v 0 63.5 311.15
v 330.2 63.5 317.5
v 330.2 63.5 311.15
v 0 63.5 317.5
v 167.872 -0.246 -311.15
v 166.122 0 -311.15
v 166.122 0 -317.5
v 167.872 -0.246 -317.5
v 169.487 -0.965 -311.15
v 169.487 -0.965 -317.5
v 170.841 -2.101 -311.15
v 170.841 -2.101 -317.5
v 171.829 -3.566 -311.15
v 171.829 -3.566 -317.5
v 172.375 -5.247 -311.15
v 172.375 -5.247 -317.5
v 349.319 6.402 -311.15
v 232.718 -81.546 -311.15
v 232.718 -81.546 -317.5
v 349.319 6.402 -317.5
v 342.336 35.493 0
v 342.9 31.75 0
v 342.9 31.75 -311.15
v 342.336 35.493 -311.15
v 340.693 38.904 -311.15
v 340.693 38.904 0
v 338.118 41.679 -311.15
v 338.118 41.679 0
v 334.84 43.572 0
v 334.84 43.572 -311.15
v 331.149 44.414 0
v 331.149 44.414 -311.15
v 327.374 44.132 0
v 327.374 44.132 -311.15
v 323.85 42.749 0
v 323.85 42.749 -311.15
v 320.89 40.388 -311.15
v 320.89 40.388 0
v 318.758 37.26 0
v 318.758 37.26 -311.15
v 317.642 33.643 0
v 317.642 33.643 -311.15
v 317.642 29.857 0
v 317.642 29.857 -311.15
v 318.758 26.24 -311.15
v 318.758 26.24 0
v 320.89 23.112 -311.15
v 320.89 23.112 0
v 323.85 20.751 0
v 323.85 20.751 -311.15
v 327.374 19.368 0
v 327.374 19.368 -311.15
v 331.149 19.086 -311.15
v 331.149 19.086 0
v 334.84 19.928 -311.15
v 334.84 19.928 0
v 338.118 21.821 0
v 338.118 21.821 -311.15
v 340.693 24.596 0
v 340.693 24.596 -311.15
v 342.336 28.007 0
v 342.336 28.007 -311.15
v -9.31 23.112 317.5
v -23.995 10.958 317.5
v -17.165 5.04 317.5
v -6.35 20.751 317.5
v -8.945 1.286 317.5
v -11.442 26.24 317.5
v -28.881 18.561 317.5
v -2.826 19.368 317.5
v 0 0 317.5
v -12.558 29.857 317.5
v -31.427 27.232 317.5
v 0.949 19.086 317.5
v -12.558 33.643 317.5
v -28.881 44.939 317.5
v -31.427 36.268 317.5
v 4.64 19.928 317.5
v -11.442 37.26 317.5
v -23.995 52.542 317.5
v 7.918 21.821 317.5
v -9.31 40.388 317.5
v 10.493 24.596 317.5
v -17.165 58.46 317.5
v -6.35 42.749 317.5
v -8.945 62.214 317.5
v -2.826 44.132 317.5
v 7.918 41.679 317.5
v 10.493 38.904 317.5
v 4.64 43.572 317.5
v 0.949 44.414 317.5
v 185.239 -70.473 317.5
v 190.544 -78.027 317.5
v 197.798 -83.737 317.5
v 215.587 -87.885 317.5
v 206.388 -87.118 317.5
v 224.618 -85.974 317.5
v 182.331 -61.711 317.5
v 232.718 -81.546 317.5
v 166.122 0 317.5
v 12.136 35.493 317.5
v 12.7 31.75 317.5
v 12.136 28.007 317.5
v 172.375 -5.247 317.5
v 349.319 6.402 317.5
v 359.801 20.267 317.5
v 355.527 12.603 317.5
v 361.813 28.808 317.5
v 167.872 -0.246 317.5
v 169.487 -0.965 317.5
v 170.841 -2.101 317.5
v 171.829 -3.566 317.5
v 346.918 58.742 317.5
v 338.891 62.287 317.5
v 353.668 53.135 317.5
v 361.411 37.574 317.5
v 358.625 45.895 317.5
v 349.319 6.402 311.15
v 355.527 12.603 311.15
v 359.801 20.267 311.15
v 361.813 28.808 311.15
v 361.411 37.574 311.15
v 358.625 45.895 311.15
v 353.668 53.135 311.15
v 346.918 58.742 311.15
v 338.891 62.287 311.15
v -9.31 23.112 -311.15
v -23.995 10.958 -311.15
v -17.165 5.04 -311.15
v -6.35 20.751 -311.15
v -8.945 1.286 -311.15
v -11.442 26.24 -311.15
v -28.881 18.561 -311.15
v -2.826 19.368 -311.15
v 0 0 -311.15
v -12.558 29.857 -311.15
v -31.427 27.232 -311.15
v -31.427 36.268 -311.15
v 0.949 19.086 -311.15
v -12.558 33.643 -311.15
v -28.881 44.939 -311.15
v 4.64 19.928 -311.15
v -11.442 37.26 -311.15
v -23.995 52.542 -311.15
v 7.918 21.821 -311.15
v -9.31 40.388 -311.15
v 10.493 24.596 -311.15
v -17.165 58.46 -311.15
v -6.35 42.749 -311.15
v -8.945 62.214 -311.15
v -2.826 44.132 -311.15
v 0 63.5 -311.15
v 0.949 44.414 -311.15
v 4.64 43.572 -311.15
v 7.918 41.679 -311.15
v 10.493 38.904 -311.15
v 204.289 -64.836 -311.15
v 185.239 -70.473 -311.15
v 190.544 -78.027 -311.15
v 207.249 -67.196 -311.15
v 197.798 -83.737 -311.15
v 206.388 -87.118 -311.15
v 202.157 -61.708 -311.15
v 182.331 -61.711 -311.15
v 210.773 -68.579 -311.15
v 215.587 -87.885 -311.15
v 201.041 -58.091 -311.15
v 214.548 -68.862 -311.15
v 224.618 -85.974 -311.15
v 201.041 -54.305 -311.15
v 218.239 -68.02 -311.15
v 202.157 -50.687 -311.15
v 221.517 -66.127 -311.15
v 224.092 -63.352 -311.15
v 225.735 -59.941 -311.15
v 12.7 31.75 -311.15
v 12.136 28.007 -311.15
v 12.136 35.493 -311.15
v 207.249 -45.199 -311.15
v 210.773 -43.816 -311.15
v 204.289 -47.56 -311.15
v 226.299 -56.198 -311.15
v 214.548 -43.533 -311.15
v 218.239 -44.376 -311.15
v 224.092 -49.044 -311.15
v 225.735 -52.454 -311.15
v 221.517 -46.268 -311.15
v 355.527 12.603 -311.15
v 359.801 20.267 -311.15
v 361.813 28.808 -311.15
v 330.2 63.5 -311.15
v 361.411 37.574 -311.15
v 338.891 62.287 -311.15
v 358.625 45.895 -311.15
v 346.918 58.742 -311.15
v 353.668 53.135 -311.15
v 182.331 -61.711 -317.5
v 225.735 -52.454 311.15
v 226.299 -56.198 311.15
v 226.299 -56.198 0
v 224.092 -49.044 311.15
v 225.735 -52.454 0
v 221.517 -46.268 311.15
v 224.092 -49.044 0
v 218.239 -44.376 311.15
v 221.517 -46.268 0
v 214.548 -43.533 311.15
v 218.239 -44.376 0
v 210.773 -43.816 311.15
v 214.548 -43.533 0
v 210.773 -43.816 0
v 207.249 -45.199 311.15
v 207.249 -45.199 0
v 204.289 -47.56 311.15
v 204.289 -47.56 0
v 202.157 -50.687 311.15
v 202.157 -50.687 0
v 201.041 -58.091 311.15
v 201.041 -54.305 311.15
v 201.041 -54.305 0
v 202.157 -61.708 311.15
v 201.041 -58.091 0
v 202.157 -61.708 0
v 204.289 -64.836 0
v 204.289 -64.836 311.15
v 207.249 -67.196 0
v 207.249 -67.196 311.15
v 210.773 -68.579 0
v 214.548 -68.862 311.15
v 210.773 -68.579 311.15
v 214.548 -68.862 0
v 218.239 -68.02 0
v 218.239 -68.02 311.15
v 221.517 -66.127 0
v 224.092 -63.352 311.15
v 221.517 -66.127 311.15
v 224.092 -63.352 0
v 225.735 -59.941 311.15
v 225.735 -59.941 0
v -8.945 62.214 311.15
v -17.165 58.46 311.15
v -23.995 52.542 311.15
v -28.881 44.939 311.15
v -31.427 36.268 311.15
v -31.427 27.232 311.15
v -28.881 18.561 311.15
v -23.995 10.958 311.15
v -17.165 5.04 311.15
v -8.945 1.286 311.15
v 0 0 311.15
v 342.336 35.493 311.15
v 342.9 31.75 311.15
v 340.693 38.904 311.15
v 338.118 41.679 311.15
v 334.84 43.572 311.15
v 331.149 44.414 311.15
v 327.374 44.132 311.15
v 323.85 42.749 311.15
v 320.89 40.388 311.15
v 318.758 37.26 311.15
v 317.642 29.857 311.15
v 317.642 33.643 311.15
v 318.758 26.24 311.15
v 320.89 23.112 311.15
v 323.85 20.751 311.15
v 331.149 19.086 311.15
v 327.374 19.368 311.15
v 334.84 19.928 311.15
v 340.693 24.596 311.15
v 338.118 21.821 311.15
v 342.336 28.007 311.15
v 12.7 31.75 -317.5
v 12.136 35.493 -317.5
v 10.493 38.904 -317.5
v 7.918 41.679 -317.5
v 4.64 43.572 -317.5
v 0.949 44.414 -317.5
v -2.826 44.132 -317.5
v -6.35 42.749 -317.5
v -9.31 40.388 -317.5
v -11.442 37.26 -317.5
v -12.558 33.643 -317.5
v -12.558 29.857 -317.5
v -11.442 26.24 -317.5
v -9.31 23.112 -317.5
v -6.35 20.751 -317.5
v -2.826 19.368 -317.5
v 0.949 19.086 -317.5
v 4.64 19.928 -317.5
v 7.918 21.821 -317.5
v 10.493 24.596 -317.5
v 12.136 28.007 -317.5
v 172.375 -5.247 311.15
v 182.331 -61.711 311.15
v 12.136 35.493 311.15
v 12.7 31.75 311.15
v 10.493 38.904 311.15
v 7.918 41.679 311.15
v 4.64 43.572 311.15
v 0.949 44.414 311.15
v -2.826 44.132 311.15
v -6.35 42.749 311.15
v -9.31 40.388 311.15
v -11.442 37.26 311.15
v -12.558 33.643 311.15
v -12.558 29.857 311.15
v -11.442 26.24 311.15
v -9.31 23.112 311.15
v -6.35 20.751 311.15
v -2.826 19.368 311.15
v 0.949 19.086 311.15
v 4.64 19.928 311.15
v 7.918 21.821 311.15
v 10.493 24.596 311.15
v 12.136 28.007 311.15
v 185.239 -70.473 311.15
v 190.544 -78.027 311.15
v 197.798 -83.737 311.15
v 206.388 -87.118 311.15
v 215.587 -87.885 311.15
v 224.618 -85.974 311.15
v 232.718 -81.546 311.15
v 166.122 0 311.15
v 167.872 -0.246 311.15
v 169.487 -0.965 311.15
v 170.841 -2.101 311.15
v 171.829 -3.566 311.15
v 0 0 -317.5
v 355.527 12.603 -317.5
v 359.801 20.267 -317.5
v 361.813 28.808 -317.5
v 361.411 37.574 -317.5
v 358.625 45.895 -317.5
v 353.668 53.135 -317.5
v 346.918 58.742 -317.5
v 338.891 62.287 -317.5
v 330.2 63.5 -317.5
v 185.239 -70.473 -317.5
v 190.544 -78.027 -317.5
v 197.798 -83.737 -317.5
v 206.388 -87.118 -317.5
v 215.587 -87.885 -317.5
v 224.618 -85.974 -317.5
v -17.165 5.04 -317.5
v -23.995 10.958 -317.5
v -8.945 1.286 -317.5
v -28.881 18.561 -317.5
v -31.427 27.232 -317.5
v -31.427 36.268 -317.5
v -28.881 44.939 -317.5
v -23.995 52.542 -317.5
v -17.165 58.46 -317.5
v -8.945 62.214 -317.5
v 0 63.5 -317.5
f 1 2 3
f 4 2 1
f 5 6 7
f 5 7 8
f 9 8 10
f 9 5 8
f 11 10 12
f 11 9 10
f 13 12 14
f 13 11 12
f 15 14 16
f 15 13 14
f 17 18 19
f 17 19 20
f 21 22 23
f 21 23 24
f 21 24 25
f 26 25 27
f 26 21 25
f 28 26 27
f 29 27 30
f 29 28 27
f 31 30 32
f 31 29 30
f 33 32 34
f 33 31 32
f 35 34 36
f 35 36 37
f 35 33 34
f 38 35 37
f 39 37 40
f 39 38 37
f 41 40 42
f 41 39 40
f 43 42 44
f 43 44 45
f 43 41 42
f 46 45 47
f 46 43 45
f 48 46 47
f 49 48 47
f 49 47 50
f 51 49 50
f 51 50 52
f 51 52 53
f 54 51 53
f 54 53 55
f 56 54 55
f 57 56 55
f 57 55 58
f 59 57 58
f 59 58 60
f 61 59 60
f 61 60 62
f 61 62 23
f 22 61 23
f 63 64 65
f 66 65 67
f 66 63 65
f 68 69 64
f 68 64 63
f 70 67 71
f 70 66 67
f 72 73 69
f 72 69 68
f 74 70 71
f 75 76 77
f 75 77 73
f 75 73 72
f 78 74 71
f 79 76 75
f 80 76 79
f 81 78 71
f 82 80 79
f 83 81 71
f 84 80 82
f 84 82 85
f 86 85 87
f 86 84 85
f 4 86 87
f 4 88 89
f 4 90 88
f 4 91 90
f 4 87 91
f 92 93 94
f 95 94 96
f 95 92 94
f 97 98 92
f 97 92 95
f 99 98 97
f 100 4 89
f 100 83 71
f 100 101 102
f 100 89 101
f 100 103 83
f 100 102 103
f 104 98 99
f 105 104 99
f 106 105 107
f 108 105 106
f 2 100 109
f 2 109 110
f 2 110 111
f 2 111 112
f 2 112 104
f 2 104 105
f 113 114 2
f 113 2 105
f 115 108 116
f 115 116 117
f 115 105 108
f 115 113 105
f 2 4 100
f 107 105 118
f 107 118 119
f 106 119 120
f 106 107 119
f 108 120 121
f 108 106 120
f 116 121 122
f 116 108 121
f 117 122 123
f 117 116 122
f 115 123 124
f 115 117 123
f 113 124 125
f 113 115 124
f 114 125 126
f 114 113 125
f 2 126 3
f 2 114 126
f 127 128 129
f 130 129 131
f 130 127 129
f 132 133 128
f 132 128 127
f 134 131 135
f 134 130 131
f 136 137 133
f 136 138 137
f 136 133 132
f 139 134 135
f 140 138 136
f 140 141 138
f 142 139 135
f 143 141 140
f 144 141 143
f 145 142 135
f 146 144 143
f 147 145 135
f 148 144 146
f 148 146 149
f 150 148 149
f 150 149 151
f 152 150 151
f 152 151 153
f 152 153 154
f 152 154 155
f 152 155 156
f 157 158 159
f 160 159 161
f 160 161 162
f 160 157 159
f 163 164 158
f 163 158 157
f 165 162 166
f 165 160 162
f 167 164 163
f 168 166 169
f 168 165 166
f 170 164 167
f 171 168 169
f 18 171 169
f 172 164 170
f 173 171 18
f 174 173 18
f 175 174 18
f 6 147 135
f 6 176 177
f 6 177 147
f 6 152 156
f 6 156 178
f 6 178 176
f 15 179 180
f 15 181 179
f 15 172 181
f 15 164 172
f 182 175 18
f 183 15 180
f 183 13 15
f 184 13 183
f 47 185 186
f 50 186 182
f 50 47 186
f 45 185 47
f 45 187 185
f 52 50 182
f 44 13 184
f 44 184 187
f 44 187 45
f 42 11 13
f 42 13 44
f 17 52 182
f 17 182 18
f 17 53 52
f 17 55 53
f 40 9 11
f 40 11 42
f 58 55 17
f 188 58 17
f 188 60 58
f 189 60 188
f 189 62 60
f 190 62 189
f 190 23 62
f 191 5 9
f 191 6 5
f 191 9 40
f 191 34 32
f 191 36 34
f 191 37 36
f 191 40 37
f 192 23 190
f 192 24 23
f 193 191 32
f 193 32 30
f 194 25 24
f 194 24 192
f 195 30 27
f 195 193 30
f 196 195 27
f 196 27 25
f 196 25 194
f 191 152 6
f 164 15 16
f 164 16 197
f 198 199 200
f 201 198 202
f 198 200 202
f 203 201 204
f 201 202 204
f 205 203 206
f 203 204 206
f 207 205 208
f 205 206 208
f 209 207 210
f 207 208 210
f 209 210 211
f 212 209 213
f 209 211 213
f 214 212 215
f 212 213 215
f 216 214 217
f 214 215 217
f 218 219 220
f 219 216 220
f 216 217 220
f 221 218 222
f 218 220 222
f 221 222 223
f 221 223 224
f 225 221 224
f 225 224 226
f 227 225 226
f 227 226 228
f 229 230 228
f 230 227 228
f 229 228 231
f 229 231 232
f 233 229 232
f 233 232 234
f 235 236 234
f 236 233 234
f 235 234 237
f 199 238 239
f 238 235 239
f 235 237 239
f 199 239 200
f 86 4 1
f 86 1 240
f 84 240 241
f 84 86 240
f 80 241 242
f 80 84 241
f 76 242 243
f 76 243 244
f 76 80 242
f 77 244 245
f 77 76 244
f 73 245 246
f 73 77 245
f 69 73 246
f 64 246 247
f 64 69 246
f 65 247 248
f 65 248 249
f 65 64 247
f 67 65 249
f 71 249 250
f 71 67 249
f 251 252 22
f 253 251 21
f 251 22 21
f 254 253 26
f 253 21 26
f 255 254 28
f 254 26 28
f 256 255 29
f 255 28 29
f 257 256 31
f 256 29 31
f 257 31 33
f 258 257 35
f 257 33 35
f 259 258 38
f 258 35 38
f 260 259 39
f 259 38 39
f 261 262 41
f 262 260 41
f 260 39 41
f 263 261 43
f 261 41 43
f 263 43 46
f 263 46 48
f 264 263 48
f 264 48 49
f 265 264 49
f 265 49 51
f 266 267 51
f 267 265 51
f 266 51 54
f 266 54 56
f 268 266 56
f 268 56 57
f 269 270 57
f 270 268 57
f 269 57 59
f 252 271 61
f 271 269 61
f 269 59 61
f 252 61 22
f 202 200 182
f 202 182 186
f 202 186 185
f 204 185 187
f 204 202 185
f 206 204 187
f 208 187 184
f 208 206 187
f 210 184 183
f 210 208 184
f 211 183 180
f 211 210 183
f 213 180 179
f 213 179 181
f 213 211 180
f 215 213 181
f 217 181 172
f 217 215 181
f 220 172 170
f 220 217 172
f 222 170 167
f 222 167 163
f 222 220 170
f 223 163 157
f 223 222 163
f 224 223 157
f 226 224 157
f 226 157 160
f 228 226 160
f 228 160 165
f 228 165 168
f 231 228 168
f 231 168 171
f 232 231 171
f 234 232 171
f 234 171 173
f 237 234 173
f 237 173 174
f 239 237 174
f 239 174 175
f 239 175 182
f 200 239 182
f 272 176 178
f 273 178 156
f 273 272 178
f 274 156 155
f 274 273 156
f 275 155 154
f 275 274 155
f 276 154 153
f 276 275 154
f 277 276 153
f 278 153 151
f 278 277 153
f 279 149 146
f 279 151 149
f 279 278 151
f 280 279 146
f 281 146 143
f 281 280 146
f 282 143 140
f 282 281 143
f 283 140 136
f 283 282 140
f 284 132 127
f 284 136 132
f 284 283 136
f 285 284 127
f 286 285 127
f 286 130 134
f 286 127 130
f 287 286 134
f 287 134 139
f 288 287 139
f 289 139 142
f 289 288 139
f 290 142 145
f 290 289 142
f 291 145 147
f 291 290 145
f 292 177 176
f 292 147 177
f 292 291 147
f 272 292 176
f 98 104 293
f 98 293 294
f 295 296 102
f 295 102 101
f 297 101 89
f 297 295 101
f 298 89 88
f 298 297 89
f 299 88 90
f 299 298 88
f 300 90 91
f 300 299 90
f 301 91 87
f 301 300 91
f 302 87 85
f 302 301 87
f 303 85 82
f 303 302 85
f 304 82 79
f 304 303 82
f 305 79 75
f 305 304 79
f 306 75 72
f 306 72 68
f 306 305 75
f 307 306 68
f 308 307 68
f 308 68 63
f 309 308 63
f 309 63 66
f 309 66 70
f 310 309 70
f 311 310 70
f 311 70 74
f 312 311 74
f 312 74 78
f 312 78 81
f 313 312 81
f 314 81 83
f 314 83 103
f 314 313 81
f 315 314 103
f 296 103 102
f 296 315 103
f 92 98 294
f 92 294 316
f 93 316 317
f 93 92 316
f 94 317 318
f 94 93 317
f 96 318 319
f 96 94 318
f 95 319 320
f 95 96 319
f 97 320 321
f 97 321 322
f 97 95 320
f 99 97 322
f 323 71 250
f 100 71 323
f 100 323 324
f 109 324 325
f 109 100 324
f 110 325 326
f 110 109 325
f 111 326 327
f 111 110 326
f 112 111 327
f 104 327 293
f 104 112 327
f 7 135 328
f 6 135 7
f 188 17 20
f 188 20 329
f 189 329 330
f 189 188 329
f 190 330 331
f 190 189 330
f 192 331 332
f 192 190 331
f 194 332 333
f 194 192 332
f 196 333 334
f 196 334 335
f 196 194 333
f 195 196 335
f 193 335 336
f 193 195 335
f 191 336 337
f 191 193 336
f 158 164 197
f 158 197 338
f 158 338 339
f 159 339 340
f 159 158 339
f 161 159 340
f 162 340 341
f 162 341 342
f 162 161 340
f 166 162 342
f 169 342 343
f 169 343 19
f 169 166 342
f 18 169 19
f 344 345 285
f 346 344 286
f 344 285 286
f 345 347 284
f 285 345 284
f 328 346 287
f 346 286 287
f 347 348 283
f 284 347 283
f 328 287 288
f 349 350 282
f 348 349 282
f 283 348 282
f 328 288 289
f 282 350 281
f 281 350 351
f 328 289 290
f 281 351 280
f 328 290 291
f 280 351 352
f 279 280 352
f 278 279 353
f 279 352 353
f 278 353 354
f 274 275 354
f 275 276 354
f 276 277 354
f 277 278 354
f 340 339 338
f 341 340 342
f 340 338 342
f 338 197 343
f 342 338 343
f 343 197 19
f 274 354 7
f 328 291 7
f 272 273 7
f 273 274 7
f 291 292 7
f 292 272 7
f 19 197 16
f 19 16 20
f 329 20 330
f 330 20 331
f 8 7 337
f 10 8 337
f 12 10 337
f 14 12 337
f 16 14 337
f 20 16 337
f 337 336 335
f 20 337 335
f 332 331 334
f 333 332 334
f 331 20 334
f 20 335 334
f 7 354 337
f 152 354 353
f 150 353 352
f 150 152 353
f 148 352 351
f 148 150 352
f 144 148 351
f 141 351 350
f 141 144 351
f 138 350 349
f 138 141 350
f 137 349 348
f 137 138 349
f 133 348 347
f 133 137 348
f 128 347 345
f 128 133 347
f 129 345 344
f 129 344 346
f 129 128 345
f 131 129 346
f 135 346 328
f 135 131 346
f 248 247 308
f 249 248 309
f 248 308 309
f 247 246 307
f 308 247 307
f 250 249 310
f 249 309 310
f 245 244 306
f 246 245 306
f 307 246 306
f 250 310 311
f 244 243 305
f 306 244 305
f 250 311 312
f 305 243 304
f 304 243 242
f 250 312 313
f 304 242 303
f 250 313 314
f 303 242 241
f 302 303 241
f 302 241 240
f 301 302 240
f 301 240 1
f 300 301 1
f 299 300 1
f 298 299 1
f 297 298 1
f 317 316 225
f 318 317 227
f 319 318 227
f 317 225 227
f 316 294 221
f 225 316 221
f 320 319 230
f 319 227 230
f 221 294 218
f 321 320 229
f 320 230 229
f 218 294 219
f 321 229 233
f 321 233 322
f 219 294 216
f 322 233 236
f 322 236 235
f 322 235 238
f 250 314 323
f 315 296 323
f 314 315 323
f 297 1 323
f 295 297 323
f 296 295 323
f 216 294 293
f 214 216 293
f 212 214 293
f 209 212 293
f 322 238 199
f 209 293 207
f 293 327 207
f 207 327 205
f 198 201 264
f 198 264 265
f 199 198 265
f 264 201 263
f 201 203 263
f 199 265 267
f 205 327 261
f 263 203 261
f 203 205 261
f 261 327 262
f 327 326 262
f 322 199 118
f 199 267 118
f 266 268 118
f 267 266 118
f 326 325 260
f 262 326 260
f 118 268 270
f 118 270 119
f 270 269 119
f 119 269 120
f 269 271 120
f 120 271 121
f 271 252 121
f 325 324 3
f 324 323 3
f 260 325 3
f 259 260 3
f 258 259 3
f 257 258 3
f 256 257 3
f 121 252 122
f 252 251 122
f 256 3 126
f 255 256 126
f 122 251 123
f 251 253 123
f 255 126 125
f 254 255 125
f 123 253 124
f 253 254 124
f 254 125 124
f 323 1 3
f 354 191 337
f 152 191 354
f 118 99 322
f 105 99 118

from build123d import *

# Parameters (mm, degrees)
SKETCH1_R                       = 12.7
BOSS_EXTRUDE1_DEPTH             = 317.5
SKETCH2_W                       = 393.7
SKETCH2_H                       = 622.3
CUT_EXTRUDE1_DEPTH              = 152.447724951
BOSS_EXTRUDE2_REACH             = 319.5
SKETCH3_R                       = 12.7
BOSS_EXTRUDE2_DIRECTION_2_REACH = 319.5


with BuildPart() as part:
    # Sketch1 → Boss-Extrude1 (new body, symmetric)
    with BuildSketch(Plane.XY):
        with BuildLine():
            Line((0, 0), (166.121717342, 0))
            ThreePointArc((166.121717342, 0), (170.203418664, -1.485617786), (172.375246574, -5.247334072))
            Line((172.375246574, -5.247334072), (182.331323933, -61.711054592))
            ThreePointArc((182.331323933, -61.711054592), (201.969223554, -85.741108229), (232.718040732, -81.545774931))
            Line((232.718040732, -81.545774931), (349.319070642, 6.40195002))
            ThreePointArc((349.319070642, 6.40195002), (360.307001568, 41.83121801), (330.2, 63.5))
            Line((330.2, 63.5), (0, 63.5))
            ThreePointArc((0, 63.5), (-31.75, 31.75), (0, 0))
        make_face()
        with Locations((0, 31.75)):
            Circle(SKETCH1_R, mode=Mode.SUBTRACT)
    extrude(amount=BOSS_EXTRUDE1_DEPTH, both=True)

    # Sketch2 → Cut-Extrude1 (cut, through all)
    with BuildSketch(Plane(origin=(0, 63.5, 0), x_dir=(1, 0, 0), z_dir=(0, 1, 0))):
        with Locations((165.1, 0)):
            Rectangle(SKETCH2_W, SKETCH2_H)
    extrude(amount=-CUT_EXTRUDE1_DEPTH, mode=Mode.SUBTRACT)

    # Sketch3 → Boss-Extrude2 (add, up to next)
    with BuildSketch(Plane.XY, mode=Mode.PRIVATE) as boss_extrude2_sk1:
        with Locations((330.2, 31.75)):
            Circle(SKETCH3_R)
    boss_extrude2_tool1 = extrude(boss_extrude2_sk1.sketch, amount=BOSS_EXTRUDE2_REACH, mode=Mode.PRIVATE) - part.part
    add(boss_extrude2_tool1.solids().sort_by_distance((330.2, 31.75, 0))[0])
    # Sketch3 → Boss-Extrude2 (add, up to next)
    with BuildSketch(Plane.XY, mode=Mode.PRIVATE) as boss_extrude2_sk2:
        with Locations((213.598970091, -56.197724951)):
            Circle(SKETCH3_R)
    boss_extrude2_tool2 = extrude(boss_extrude2_sk2.sketch, amount=BOSS_EXTRUDE2_REACH, mode=Mode.PRIVATE) - part.part
    add(boss_extrude2_tool2.solids().sort_by_distance((213.59897, -56.197725, 0))[0])

    # Sketch3 → Boss-Extrude2 direction 2 (add, up to next)
    with BuildSketch(Plane.XY, mode=Mode.PRIVATE) as boss_extrude2_direction_2_sk1:
        with Locations((330.2, 31.75)):
            Circle(SKETCH3_R)
    boss_extrude2_direction_2_tool1 = extrude(boss_extrude2_direction_2_sk1.sketch, amount=-BOSS_EXTRUDE2_DIRECTION_2_REACH, mode=Mode.PRIVATE) - part.part
    add(boss_extrude2_direction_2_tool1.solids().sort_by_distance((330.2, 31.75, 0))[0])
    # Sketch3 → Boss-Extrude2 direction 2 (add, up to next)
    with BuildSketch(Plane.XY, mode=Mode.PRIVATE) as boss_extrude2_direction_2_sk2:
        with Locations((213.598970091, -56.197724951)):
            Circle(SKETCH3_R)
    boss_extrude2_direction_2_tool2 = extrude(boss_extrude2_direction_2_sk2.sketch, amount=-BOSS_EXTRUDE2_DIRECTION_2_REACH, mode=Mode.PRIVATE) - part.part
    add(boss_extrude2_direction_2_tool2.solids().sort_by_distance((213.59897, -56.197725, 0))[0])


solid = part.part
